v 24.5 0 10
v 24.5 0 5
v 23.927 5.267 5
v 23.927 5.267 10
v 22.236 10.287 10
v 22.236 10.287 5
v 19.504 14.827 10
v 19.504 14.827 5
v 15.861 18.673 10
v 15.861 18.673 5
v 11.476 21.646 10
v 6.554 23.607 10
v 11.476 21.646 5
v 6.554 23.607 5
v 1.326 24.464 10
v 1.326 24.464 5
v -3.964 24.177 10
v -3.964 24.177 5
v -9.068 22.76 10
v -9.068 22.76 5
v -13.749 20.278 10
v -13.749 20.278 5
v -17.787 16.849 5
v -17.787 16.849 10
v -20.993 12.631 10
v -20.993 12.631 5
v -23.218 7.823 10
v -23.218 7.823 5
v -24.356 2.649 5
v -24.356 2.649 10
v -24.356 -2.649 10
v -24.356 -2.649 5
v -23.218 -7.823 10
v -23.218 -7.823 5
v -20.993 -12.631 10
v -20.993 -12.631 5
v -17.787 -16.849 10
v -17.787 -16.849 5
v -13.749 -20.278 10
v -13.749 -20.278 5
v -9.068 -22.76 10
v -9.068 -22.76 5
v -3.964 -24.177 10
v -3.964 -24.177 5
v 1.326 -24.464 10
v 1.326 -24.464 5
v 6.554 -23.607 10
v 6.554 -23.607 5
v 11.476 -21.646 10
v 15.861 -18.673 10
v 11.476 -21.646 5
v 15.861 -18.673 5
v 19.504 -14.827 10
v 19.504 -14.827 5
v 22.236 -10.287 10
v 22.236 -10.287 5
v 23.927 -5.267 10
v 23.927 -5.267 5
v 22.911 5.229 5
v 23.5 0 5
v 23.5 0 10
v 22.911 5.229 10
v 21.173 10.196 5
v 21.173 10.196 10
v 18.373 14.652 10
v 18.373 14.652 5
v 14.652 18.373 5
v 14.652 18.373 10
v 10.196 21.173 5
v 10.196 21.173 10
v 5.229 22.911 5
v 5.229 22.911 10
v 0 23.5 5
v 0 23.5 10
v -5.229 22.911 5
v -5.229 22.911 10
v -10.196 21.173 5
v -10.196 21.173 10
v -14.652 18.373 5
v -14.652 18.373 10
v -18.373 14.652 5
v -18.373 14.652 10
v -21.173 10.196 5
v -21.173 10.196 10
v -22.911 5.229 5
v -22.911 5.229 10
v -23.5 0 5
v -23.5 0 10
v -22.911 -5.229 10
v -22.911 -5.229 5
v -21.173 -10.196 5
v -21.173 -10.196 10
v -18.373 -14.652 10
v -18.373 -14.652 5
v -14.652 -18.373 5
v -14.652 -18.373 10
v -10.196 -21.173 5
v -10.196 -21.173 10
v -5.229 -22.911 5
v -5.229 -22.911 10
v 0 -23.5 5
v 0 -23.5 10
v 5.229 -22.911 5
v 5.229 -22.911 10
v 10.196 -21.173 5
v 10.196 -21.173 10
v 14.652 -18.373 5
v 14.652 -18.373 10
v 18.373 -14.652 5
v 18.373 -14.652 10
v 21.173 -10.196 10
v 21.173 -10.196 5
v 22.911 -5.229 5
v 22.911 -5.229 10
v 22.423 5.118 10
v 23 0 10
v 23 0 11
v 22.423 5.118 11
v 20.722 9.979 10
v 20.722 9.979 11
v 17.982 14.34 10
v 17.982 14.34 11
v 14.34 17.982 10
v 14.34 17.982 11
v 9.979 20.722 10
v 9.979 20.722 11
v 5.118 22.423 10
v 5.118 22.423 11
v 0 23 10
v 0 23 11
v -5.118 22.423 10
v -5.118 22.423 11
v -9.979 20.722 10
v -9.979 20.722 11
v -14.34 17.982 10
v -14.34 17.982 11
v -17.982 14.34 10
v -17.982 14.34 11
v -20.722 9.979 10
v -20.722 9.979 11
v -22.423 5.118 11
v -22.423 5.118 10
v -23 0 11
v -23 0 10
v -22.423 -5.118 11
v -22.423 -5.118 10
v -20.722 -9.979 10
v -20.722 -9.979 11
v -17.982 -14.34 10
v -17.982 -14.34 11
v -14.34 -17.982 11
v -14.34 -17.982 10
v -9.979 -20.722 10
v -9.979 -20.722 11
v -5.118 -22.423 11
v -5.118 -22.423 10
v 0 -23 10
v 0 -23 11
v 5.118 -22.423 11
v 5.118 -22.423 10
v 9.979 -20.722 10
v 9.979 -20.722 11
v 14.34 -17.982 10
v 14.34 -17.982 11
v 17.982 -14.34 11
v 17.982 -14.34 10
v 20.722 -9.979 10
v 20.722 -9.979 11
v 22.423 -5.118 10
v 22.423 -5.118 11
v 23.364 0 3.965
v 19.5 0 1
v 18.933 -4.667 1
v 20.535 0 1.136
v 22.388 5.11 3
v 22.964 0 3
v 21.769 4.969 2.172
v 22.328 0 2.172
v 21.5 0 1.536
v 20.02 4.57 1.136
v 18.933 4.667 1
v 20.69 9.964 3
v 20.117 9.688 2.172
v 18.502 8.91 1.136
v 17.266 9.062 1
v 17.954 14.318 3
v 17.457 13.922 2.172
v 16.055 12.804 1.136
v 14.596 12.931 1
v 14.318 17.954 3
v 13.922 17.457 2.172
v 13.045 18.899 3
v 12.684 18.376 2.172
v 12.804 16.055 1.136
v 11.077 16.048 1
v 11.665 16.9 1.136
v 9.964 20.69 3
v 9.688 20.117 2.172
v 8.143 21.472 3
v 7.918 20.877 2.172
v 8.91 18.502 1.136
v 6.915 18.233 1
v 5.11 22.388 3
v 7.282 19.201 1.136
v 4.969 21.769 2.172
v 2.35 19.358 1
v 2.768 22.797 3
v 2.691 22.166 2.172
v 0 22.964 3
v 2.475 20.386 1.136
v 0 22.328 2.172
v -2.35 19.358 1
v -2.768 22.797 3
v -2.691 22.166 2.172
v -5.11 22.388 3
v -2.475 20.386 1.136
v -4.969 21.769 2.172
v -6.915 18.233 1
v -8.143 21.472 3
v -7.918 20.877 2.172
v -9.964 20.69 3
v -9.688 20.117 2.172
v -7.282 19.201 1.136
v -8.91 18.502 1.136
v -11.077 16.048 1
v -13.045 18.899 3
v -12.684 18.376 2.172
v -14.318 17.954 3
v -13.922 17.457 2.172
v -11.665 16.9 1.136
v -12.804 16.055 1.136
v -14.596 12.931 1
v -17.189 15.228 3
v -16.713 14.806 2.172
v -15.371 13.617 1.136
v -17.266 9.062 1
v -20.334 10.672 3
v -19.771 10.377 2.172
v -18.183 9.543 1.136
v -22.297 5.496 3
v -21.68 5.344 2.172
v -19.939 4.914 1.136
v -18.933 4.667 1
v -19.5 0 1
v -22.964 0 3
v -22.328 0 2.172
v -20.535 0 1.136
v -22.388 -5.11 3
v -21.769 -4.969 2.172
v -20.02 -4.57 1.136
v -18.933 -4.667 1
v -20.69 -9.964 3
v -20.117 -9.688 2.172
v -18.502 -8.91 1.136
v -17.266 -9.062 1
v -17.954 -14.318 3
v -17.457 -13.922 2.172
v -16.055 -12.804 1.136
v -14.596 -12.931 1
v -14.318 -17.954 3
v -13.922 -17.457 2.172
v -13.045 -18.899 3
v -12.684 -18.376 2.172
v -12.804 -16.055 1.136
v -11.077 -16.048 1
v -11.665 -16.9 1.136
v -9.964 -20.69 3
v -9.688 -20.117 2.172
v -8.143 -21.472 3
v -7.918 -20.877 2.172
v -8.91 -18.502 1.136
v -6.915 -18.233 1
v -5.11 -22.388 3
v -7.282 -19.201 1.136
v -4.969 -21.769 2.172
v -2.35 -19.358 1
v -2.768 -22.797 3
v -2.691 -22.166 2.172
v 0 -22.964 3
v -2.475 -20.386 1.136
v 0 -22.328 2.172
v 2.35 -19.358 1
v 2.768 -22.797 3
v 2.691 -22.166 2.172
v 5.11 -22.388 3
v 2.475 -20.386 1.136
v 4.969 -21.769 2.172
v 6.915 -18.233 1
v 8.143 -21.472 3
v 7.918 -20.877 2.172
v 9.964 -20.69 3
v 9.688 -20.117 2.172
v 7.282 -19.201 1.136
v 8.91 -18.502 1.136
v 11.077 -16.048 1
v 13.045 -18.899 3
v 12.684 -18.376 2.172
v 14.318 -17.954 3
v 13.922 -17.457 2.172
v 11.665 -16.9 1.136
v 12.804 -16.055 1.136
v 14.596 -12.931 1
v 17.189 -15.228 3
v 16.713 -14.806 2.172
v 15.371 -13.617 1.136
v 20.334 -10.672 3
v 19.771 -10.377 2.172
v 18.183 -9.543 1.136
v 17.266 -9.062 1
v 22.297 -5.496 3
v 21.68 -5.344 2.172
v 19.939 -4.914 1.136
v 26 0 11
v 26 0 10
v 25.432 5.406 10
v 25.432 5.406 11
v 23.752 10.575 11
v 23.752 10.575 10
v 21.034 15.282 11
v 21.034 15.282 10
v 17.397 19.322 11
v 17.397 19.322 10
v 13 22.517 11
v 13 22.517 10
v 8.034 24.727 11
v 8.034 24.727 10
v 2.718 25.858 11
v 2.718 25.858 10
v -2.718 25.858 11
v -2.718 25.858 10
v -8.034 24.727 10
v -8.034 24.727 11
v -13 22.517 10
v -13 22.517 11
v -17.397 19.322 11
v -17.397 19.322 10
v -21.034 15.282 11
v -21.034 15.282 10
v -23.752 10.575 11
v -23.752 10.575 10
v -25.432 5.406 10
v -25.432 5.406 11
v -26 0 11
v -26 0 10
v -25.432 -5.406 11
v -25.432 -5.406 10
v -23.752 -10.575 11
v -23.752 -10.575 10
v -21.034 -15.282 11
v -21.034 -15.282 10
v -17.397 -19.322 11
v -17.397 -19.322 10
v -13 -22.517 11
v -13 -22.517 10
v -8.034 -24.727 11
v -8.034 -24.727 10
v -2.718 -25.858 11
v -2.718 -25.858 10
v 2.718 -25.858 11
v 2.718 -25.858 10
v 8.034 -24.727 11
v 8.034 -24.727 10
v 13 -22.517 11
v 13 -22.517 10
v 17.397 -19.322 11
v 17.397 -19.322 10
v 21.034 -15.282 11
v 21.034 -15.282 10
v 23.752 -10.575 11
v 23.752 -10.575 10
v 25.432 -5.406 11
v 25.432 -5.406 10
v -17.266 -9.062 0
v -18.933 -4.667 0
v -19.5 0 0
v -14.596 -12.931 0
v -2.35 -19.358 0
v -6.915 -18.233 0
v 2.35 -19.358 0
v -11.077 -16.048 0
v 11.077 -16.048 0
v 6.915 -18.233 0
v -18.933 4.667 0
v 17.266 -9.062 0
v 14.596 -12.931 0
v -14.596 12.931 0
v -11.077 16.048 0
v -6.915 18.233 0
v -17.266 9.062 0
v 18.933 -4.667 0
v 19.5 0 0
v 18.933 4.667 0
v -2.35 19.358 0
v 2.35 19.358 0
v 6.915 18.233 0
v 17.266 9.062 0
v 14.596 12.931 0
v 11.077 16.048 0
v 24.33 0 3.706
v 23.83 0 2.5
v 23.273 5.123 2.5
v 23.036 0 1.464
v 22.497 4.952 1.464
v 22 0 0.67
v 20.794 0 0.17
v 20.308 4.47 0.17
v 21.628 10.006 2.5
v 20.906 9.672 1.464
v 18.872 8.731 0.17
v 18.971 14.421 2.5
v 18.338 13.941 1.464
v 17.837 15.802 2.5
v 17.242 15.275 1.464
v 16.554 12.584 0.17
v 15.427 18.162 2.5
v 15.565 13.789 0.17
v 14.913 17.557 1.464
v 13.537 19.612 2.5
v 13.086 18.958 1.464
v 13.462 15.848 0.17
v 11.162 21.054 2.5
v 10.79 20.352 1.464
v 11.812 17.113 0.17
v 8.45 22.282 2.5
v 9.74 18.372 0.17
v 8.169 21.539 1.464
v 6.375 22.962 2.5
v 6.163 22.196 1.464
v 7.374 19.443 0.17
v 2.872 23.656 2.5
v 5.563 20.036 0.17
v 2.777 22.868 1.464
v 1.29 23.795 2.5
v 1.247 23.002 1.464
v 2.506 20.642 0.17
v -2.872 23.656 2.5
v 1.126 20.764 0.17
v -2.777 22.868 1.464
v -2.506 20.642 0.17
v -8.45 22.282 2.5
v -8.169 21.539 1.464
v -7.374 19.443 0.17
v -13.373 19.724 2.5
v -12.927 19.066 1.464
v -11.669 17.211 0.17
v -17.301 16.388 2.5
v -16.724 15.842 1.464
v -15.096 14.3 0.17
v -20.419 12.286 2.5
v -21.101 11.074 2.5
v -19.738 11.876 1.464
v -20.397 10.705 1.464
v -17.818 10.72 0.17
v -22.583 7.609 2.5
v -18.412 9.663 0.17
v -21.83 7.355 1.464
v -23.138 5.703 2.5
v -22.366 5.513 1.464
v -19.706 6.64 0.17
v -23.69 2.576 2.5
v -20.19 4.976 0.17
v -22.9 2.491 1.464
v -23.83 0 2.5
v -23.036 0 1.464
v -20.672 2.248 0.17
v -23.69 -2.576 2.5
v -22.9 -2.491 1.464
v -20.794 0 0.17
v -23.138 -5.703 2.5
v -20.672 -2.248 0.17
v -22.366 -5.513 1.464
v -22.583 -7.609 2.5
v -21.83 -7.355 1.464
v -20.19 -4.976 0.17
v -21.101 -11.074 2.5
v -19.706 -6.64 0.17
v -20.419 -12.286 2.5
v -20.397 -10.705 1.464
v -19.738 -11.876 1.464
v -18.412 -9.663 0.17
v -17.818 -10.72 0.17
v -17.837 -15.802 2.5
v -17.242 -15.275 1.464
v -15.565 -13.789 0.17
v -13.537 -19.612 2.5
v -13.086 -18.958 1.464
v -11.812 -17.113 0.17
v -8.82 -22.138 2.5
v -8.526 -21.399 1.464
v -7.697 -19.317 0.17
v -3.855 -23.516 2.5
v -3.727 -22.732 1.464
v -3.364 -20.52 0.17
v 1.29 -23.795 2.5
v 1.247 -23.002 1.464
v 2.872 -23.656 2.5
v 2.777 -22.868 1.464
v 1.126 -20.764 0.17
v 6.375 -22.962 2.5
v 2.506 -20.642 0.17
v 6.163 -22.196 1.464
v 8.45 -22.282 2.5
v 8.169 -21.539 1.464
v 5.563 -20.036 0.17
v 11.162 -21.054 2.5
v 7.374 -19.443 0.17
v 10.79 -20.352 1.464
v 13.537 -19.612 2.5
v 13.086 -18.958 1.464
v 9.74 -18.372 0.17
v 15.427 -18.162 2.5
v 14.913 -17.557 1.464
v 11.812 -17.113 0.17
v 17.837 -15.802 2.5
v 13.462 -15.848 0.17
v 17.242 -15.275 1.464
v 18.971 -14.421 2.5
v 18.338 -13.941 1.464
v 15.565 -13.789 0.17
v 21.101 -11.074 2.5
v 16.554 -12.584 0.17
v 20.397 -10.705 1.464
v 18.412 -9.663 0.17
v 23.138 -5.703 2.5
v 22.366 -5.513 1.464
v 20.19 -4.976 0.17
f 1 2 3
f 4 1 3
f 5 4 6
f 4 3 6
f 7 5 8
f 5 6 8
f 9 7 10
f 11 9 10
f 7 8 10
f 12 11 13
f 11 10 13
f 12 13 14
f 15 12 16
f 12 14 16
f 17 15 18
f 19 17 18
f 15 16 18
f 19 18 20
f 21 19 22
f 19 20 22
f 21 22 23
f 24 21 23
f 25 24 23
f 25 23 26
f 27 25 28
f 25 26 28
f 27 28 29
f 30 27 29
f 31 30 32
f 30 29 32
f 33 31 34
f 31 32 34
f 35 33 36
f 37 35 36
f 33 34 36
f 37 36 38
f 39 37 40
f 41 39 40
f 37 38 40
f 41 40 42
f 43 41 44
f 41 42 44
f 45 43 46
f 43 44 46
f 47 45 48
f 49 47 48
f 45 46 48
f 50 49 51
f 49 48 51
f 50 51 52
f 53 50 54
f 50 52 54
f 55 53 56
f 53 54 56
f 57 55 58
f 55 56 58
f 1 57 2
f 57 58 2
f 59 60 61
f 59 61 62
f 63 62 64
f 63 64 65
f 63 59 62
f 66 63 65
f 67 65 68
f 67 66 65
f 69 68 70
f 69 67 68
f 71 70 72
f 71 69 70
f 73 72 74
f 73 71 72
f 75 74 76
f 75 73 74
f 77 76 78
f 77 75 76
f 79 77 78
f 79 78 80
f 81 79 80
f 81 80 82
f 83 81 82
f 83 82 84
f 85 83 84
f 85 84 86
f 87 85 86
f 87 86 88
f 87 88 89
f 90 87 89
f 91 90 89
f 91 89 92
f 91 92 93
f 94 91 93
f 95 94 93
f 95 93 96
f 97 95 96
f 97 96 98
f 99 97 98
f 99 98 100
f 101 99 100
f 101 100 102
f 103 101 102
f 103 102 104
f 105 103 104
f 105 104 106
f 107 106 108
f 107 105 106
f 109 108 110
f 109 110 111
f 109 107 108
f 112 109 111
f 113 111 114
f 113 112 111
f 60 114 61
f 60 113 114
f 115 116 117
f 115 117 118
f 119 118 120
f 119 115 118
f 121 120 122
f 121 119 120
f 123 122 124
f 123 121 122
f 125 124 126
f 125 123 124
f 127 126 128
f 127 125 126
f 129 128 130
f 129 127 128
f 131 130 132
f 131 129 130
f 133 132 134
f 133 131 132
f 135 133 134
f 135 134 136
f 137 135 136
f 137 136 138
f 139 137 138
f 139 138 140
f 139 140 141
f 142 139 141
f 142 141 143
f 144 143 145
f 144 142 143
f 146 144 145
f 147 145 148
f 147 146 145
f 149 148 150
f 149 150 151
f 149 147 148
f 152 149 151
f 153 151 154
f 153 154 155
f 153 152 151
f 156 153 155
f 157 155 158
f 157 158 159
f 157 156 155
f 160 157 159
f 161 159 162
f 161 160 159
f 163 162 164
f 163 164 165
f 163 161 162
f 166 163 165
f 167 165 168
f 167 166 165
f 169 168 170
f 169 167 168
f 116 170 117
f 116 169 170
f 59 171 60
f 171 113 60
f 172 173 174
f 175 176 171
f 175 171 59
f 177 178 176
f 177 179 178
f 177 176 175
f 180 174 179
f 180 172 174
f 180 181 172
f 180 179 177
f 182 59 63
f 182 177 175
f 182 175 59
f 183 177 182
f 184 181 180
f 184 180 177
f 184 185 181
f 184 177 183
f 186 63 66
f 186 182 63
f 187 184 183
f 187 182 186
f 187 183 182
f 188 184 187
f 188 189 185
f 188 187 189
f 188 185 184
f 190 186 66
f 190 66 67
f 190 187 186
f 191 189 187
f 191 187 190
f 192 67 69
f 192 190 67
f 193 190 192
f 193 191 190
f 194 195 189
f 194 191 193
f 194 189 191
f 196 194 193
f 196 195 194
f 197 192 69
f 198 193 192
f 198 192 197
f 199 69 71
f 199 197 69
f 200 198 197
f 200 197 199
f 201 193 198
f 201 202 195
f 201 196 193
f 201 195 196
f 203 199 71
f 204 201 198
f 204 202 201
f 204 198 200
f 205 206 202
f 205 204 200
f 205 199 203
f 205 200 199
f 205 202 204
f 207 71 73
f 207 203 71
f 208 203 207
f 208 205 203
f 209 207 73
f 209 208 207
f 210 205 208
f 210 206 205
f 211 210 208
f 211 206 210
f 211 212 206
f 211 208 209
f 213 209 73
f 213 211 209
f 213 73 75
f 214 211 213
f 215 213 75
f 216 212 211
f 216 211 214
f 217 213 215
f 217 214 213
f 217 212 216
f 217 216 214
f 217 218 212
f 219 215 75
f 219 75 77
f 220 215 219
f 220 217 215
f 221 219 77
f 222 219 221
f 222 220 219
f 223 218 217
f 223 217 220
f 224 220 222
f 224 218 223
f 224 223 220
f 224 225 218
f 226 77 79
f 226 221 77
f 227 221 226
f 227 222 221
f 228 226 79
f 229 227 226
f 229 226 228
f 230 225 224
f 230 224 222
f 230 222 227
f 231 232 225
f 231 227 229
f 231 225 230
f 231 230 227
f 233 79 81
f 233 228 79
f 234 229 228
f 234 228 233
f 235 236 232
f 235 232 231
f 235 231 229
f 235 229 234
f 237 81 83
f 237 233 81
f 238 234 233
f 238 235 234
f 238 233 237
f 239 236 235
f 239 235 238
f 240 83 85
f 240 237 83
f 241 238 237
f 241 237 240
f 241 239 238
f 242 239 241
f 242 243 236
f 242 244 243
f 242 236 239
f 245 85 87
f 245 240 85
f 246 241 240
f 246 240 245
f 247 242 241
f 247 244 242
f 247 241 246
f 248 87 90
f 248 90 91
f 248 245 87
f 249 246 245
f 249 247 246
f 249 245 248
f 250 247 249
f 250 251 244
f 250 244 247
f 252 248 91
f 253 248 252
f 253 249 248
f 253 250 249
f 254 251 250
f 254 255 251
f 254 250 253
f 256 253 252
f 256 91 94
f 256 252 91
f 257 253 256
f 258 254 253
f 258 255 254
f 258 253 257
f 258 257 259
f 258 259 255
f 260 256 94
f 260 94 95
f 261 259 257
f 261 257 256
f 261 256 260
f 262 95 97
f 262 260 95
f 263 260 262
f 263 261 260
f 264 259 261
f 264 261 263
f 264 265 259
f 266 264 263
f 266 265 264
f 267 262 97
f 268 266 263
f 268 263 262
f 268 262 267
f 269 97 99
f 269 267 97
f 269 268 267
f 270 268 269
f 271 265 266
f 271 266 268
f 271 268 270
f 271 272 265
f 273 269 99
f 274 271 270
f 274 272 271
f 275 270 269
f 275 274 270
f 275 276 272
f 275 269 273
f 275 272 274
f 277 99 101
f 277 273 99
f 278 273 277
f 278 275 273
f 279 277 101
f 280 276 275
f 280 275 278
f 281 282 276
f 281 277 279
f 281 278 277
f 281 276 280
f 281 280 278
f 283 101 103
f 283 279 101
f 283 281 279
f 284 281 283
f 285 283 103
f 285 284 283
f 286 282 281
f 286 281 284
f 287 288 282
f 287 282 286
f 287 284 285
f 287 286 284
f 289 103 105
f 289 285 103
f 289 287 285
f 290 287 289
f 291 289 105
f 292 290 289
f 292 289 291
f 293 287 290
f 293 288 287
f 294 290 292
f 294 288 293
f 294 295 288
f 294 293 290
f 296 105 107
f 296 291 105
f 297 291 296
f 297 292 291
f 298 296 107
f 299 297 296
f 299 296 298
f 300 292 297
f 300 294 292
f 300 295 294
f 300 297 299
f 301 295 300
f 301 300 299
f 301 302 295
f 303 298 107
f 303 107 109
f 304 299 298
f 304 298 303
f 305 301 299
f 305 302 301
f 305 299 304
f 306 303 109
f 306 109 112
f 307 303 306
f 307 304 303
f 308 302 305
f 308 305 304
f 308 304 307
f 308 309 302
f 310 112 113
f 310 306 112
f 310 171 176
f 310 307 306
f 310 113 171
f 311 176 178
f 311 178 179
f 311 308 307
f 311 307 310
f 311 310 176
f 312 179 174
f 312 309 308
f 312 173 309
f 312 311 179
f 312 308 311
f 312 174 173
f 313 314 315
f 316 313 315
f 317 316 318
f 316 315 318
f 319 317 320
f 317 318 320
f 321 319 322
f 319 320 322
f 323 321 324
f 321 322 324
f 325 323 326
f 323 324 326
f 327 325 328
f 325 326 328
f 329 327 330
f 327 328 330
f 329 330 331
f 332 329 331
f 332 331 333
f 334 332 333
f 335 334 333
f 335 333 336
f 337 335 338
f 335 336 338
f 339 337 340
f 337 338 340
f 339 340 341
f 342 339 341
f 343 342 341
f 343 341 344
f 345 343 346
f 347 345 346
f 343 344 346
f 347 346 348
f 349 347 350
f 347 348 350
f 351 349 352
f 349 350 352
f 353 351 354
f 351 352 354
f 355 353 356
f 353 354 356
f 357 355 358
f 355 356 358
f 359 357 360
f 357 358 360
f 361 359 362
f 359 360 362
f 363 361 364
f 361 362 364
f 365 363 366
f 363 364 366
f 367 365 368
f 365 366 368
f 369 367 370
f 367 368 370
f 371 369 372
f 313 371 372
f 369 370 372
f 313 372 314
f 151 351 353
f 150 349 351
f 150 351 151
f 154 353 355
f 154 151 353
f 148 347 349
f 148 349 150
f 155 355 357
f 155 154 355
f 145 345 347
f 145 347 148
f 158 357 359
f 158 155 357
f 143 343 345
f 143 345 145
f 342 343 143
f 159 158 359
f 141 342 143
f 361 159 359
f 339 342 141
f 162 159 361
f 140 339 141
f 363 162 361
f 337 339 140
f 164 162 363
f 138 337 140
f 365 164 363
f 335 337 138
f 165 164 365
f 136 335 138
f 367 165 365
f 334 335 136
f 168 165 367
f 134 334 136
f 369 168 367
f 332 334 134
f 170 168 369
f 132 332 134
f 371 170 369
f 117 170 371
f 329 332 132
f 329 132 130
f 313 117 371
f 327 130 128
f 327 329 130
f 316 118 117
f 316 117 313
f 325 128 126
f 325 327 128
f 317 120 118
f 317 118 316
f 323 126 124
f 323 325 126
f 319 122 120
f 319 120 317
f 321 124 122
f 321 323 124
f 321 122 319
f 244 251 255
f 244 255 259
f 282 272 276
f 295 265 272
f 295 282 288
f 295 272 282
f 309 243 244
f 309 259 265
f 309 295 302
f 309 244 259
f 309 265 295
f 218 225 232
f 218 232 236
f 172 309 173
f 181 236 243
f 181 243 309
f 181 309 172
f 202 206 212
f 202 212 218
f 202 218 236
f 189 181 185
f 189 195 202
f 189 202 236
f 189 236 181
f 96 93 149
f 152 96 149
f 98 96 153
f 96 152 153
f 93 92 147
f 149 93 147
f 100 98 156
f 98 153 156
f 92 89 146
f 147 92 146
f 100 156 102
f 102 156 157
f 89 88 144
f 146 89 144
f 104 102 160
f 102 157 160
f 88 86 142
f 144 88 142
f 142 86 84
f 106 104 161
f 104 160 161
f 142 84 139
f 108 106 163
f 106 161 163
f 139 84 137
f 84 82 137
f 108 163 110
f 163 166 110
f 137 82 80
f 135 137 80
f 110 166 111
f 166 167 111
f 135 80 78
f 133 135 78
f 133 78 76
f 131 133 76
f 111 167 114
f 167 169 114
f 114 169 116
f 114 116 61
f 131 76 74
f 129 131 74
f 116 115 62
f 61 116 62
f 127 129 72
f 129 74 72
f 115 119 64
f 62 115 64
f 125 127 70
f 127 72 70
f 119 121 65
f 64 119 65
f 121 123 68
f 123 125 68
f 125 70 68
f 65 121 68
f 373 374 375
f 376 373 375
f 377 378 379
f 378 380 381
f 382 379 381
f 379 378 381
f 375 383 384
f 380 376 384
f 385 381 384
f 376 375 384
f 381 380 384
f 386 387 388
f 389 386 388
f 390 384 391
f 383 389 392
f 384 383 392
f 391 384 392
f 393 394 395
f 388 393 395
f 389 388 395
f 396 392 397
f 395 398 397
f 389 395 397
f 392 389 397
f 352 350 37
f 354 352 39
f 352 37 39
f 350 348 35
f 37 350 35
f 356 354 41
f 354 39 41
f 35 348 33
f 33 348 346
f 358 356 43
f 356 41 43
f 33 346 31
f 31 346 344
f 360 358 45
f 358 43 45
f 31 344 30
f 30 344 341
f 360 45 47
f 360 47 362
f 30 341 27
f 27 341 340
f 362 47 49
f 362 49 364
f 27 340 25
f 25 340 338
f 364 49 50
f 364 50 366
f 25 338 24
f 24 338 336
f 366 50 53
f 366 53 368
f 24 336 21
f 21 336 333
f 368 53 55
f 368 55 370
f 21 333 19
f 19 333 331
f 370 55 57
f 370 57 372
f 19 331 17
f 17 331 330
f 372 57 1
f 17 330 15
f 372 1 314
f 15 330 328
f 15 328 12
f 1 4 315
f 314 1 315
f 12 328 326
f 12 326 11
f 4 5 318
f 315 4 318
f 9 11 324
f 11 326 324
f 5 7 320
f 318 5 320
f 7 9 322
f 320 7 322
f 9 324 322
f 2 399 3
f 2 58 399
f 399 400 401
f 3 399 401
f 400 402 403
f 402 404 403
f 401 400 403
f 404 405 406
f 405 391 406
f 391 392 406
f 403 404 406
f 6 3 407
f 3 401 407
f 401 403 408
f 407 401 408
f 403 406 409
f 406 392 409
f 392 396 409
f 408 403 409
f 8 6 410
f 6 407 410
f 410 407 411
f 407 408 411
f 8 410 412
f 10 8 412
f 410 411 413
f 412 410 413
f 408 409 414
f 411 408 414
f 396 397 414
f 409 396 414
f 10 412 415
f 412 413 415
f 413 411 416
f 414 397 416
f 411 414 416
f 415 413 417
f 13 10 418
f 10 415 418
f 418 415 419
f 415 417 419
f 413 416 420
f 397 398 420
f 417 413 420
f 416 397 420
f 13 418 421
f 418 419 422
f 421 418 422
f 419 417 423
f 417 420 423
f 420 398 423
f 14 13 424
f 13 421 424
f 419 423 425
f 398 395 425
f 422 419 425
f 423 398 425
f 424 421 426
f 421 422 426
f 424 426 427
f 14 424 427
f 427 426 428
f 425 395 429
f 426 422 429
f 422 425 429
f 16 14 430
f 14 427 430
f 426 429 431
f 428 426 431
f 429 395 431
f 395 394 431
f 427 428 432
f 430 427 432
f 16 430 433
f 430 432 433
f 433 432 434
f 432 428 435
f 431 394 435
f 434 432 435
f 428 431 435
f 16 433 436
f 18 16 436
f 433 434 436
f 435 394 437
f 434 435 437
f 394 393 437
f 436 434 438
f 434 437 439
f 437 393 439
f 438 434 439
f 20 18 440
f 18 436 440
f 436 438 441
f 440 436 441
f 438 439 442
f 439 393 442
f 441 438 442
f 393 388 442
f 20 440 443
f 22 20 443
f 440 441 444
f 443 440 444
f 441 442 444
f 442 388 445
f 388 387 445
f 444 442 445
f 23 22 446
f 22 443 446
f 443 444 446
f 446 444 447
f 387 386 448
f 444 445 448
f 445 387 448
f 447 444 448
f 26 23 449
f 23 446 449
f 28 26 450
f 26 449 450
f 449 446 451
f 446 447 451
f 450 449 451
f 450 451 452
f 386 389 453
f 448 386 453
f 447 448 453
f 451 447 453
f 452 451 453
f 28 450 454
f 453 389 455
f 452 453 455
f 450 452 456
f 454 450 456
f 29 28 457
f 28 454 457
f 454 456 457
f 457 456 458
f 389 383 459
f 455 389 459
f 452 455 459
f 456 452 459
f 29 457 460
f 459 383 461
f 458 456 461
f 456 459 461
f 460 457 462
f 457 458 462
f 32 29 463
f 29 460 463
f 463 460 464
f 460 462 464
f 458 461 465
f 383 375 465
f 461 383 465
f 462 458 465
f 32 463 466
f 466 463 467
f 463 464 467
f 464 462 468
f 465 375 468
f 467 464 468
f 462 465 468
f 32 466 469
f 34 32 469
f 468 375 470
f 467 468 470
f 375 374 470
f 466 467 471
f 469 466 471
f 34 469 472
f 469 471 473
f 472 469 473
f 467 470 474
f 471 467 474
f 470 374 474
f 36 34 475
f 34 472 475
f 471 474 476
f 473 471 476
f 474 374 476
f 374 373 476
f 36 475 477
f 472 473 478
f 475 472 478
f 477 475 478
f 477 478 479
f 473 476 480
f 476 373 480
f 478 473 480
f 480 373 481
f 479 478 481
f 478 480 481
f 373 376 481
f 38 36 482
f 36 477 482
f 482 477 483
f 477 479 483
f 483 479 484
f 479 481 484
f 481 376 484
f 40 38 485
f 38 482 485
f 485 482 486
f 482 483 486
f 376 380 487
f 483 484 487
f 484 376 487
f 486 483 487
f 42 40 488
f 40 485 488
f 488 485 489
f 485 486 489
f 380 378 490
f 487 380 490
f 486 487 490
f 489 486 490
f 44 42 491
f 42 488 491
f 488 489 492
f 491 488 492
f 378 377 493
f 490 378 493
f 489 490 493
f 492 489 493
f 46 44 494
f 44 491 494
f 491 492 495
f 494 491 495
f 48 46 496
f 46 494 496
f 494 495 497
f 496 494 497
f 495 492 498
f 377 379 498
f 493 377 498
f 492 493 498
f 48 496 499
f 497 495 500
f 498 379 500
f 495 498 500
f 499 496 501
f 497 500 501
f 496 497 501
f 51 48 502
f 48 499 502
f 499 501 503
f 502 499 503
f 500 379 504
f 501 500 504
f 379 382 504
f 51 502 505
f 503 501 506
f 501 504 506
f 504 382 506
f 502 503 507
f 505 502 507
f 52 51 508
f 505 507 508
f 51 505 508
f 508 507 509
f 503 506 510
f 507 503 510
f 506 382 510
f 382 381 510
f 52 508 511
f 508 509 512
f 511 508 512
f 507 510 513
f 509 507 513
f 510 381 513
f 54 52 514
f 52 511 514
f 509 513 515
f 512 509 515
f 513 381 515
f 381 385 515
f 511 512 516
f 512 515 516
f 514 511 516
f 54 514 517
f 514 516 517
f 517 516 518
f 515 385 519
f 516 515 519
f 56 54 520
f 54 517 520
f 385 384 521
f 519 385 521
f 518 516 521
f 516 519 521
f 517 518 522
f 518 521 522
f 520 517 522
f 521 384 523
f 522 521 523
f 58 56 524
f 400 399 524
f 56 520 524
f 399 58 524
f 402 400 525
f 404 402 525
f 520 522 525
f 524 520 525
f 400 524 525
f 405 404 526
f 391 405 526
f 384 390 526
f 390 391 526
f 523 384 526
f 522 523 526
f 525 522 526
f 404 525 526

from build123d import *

# Parameters (mm, degrees)
SKETCH_R      = 24.5
PAD_DEPTH     = 10
FILLET_R      = 5
THICKNESS_T   = -1
SKETCH001_R   = 26
SKETCH001_R_2 = 23
PAD001_DEPTH  = 1


with BuildPart() as part:
    # Sketch → Pad (new body)
    with BuildSketch(Plane.XY):
        Circle(SKETCH_R)
    extrude(amount=PAD_DEPTH)

    # Fillet
    fillet_edges = [part.edges().sort_by_distance(p)[0] for p in [
        (-24.5, 0, 0),
    ]]
    fillet(fillet_edges, radius=FILLET_R)

    # Thickness
    thickness_openings = [part.faces().sort_by_distance(p)[0] for p in [
        (0, 0, 10),
    ]]
    offset(amount=THICKNESS_T, openings=thickness_openings)

    # Sketch001 → Pad001 (new body)
    with BuildSketch(Plane.XY.offset(10)):
        Circle(SKETCH001_R)
        Circle(SKETCH001_R_2, mode=Mode.SUBTRACT)
    extrude(amount=PAD001_DEPTH)


solid = part.part
